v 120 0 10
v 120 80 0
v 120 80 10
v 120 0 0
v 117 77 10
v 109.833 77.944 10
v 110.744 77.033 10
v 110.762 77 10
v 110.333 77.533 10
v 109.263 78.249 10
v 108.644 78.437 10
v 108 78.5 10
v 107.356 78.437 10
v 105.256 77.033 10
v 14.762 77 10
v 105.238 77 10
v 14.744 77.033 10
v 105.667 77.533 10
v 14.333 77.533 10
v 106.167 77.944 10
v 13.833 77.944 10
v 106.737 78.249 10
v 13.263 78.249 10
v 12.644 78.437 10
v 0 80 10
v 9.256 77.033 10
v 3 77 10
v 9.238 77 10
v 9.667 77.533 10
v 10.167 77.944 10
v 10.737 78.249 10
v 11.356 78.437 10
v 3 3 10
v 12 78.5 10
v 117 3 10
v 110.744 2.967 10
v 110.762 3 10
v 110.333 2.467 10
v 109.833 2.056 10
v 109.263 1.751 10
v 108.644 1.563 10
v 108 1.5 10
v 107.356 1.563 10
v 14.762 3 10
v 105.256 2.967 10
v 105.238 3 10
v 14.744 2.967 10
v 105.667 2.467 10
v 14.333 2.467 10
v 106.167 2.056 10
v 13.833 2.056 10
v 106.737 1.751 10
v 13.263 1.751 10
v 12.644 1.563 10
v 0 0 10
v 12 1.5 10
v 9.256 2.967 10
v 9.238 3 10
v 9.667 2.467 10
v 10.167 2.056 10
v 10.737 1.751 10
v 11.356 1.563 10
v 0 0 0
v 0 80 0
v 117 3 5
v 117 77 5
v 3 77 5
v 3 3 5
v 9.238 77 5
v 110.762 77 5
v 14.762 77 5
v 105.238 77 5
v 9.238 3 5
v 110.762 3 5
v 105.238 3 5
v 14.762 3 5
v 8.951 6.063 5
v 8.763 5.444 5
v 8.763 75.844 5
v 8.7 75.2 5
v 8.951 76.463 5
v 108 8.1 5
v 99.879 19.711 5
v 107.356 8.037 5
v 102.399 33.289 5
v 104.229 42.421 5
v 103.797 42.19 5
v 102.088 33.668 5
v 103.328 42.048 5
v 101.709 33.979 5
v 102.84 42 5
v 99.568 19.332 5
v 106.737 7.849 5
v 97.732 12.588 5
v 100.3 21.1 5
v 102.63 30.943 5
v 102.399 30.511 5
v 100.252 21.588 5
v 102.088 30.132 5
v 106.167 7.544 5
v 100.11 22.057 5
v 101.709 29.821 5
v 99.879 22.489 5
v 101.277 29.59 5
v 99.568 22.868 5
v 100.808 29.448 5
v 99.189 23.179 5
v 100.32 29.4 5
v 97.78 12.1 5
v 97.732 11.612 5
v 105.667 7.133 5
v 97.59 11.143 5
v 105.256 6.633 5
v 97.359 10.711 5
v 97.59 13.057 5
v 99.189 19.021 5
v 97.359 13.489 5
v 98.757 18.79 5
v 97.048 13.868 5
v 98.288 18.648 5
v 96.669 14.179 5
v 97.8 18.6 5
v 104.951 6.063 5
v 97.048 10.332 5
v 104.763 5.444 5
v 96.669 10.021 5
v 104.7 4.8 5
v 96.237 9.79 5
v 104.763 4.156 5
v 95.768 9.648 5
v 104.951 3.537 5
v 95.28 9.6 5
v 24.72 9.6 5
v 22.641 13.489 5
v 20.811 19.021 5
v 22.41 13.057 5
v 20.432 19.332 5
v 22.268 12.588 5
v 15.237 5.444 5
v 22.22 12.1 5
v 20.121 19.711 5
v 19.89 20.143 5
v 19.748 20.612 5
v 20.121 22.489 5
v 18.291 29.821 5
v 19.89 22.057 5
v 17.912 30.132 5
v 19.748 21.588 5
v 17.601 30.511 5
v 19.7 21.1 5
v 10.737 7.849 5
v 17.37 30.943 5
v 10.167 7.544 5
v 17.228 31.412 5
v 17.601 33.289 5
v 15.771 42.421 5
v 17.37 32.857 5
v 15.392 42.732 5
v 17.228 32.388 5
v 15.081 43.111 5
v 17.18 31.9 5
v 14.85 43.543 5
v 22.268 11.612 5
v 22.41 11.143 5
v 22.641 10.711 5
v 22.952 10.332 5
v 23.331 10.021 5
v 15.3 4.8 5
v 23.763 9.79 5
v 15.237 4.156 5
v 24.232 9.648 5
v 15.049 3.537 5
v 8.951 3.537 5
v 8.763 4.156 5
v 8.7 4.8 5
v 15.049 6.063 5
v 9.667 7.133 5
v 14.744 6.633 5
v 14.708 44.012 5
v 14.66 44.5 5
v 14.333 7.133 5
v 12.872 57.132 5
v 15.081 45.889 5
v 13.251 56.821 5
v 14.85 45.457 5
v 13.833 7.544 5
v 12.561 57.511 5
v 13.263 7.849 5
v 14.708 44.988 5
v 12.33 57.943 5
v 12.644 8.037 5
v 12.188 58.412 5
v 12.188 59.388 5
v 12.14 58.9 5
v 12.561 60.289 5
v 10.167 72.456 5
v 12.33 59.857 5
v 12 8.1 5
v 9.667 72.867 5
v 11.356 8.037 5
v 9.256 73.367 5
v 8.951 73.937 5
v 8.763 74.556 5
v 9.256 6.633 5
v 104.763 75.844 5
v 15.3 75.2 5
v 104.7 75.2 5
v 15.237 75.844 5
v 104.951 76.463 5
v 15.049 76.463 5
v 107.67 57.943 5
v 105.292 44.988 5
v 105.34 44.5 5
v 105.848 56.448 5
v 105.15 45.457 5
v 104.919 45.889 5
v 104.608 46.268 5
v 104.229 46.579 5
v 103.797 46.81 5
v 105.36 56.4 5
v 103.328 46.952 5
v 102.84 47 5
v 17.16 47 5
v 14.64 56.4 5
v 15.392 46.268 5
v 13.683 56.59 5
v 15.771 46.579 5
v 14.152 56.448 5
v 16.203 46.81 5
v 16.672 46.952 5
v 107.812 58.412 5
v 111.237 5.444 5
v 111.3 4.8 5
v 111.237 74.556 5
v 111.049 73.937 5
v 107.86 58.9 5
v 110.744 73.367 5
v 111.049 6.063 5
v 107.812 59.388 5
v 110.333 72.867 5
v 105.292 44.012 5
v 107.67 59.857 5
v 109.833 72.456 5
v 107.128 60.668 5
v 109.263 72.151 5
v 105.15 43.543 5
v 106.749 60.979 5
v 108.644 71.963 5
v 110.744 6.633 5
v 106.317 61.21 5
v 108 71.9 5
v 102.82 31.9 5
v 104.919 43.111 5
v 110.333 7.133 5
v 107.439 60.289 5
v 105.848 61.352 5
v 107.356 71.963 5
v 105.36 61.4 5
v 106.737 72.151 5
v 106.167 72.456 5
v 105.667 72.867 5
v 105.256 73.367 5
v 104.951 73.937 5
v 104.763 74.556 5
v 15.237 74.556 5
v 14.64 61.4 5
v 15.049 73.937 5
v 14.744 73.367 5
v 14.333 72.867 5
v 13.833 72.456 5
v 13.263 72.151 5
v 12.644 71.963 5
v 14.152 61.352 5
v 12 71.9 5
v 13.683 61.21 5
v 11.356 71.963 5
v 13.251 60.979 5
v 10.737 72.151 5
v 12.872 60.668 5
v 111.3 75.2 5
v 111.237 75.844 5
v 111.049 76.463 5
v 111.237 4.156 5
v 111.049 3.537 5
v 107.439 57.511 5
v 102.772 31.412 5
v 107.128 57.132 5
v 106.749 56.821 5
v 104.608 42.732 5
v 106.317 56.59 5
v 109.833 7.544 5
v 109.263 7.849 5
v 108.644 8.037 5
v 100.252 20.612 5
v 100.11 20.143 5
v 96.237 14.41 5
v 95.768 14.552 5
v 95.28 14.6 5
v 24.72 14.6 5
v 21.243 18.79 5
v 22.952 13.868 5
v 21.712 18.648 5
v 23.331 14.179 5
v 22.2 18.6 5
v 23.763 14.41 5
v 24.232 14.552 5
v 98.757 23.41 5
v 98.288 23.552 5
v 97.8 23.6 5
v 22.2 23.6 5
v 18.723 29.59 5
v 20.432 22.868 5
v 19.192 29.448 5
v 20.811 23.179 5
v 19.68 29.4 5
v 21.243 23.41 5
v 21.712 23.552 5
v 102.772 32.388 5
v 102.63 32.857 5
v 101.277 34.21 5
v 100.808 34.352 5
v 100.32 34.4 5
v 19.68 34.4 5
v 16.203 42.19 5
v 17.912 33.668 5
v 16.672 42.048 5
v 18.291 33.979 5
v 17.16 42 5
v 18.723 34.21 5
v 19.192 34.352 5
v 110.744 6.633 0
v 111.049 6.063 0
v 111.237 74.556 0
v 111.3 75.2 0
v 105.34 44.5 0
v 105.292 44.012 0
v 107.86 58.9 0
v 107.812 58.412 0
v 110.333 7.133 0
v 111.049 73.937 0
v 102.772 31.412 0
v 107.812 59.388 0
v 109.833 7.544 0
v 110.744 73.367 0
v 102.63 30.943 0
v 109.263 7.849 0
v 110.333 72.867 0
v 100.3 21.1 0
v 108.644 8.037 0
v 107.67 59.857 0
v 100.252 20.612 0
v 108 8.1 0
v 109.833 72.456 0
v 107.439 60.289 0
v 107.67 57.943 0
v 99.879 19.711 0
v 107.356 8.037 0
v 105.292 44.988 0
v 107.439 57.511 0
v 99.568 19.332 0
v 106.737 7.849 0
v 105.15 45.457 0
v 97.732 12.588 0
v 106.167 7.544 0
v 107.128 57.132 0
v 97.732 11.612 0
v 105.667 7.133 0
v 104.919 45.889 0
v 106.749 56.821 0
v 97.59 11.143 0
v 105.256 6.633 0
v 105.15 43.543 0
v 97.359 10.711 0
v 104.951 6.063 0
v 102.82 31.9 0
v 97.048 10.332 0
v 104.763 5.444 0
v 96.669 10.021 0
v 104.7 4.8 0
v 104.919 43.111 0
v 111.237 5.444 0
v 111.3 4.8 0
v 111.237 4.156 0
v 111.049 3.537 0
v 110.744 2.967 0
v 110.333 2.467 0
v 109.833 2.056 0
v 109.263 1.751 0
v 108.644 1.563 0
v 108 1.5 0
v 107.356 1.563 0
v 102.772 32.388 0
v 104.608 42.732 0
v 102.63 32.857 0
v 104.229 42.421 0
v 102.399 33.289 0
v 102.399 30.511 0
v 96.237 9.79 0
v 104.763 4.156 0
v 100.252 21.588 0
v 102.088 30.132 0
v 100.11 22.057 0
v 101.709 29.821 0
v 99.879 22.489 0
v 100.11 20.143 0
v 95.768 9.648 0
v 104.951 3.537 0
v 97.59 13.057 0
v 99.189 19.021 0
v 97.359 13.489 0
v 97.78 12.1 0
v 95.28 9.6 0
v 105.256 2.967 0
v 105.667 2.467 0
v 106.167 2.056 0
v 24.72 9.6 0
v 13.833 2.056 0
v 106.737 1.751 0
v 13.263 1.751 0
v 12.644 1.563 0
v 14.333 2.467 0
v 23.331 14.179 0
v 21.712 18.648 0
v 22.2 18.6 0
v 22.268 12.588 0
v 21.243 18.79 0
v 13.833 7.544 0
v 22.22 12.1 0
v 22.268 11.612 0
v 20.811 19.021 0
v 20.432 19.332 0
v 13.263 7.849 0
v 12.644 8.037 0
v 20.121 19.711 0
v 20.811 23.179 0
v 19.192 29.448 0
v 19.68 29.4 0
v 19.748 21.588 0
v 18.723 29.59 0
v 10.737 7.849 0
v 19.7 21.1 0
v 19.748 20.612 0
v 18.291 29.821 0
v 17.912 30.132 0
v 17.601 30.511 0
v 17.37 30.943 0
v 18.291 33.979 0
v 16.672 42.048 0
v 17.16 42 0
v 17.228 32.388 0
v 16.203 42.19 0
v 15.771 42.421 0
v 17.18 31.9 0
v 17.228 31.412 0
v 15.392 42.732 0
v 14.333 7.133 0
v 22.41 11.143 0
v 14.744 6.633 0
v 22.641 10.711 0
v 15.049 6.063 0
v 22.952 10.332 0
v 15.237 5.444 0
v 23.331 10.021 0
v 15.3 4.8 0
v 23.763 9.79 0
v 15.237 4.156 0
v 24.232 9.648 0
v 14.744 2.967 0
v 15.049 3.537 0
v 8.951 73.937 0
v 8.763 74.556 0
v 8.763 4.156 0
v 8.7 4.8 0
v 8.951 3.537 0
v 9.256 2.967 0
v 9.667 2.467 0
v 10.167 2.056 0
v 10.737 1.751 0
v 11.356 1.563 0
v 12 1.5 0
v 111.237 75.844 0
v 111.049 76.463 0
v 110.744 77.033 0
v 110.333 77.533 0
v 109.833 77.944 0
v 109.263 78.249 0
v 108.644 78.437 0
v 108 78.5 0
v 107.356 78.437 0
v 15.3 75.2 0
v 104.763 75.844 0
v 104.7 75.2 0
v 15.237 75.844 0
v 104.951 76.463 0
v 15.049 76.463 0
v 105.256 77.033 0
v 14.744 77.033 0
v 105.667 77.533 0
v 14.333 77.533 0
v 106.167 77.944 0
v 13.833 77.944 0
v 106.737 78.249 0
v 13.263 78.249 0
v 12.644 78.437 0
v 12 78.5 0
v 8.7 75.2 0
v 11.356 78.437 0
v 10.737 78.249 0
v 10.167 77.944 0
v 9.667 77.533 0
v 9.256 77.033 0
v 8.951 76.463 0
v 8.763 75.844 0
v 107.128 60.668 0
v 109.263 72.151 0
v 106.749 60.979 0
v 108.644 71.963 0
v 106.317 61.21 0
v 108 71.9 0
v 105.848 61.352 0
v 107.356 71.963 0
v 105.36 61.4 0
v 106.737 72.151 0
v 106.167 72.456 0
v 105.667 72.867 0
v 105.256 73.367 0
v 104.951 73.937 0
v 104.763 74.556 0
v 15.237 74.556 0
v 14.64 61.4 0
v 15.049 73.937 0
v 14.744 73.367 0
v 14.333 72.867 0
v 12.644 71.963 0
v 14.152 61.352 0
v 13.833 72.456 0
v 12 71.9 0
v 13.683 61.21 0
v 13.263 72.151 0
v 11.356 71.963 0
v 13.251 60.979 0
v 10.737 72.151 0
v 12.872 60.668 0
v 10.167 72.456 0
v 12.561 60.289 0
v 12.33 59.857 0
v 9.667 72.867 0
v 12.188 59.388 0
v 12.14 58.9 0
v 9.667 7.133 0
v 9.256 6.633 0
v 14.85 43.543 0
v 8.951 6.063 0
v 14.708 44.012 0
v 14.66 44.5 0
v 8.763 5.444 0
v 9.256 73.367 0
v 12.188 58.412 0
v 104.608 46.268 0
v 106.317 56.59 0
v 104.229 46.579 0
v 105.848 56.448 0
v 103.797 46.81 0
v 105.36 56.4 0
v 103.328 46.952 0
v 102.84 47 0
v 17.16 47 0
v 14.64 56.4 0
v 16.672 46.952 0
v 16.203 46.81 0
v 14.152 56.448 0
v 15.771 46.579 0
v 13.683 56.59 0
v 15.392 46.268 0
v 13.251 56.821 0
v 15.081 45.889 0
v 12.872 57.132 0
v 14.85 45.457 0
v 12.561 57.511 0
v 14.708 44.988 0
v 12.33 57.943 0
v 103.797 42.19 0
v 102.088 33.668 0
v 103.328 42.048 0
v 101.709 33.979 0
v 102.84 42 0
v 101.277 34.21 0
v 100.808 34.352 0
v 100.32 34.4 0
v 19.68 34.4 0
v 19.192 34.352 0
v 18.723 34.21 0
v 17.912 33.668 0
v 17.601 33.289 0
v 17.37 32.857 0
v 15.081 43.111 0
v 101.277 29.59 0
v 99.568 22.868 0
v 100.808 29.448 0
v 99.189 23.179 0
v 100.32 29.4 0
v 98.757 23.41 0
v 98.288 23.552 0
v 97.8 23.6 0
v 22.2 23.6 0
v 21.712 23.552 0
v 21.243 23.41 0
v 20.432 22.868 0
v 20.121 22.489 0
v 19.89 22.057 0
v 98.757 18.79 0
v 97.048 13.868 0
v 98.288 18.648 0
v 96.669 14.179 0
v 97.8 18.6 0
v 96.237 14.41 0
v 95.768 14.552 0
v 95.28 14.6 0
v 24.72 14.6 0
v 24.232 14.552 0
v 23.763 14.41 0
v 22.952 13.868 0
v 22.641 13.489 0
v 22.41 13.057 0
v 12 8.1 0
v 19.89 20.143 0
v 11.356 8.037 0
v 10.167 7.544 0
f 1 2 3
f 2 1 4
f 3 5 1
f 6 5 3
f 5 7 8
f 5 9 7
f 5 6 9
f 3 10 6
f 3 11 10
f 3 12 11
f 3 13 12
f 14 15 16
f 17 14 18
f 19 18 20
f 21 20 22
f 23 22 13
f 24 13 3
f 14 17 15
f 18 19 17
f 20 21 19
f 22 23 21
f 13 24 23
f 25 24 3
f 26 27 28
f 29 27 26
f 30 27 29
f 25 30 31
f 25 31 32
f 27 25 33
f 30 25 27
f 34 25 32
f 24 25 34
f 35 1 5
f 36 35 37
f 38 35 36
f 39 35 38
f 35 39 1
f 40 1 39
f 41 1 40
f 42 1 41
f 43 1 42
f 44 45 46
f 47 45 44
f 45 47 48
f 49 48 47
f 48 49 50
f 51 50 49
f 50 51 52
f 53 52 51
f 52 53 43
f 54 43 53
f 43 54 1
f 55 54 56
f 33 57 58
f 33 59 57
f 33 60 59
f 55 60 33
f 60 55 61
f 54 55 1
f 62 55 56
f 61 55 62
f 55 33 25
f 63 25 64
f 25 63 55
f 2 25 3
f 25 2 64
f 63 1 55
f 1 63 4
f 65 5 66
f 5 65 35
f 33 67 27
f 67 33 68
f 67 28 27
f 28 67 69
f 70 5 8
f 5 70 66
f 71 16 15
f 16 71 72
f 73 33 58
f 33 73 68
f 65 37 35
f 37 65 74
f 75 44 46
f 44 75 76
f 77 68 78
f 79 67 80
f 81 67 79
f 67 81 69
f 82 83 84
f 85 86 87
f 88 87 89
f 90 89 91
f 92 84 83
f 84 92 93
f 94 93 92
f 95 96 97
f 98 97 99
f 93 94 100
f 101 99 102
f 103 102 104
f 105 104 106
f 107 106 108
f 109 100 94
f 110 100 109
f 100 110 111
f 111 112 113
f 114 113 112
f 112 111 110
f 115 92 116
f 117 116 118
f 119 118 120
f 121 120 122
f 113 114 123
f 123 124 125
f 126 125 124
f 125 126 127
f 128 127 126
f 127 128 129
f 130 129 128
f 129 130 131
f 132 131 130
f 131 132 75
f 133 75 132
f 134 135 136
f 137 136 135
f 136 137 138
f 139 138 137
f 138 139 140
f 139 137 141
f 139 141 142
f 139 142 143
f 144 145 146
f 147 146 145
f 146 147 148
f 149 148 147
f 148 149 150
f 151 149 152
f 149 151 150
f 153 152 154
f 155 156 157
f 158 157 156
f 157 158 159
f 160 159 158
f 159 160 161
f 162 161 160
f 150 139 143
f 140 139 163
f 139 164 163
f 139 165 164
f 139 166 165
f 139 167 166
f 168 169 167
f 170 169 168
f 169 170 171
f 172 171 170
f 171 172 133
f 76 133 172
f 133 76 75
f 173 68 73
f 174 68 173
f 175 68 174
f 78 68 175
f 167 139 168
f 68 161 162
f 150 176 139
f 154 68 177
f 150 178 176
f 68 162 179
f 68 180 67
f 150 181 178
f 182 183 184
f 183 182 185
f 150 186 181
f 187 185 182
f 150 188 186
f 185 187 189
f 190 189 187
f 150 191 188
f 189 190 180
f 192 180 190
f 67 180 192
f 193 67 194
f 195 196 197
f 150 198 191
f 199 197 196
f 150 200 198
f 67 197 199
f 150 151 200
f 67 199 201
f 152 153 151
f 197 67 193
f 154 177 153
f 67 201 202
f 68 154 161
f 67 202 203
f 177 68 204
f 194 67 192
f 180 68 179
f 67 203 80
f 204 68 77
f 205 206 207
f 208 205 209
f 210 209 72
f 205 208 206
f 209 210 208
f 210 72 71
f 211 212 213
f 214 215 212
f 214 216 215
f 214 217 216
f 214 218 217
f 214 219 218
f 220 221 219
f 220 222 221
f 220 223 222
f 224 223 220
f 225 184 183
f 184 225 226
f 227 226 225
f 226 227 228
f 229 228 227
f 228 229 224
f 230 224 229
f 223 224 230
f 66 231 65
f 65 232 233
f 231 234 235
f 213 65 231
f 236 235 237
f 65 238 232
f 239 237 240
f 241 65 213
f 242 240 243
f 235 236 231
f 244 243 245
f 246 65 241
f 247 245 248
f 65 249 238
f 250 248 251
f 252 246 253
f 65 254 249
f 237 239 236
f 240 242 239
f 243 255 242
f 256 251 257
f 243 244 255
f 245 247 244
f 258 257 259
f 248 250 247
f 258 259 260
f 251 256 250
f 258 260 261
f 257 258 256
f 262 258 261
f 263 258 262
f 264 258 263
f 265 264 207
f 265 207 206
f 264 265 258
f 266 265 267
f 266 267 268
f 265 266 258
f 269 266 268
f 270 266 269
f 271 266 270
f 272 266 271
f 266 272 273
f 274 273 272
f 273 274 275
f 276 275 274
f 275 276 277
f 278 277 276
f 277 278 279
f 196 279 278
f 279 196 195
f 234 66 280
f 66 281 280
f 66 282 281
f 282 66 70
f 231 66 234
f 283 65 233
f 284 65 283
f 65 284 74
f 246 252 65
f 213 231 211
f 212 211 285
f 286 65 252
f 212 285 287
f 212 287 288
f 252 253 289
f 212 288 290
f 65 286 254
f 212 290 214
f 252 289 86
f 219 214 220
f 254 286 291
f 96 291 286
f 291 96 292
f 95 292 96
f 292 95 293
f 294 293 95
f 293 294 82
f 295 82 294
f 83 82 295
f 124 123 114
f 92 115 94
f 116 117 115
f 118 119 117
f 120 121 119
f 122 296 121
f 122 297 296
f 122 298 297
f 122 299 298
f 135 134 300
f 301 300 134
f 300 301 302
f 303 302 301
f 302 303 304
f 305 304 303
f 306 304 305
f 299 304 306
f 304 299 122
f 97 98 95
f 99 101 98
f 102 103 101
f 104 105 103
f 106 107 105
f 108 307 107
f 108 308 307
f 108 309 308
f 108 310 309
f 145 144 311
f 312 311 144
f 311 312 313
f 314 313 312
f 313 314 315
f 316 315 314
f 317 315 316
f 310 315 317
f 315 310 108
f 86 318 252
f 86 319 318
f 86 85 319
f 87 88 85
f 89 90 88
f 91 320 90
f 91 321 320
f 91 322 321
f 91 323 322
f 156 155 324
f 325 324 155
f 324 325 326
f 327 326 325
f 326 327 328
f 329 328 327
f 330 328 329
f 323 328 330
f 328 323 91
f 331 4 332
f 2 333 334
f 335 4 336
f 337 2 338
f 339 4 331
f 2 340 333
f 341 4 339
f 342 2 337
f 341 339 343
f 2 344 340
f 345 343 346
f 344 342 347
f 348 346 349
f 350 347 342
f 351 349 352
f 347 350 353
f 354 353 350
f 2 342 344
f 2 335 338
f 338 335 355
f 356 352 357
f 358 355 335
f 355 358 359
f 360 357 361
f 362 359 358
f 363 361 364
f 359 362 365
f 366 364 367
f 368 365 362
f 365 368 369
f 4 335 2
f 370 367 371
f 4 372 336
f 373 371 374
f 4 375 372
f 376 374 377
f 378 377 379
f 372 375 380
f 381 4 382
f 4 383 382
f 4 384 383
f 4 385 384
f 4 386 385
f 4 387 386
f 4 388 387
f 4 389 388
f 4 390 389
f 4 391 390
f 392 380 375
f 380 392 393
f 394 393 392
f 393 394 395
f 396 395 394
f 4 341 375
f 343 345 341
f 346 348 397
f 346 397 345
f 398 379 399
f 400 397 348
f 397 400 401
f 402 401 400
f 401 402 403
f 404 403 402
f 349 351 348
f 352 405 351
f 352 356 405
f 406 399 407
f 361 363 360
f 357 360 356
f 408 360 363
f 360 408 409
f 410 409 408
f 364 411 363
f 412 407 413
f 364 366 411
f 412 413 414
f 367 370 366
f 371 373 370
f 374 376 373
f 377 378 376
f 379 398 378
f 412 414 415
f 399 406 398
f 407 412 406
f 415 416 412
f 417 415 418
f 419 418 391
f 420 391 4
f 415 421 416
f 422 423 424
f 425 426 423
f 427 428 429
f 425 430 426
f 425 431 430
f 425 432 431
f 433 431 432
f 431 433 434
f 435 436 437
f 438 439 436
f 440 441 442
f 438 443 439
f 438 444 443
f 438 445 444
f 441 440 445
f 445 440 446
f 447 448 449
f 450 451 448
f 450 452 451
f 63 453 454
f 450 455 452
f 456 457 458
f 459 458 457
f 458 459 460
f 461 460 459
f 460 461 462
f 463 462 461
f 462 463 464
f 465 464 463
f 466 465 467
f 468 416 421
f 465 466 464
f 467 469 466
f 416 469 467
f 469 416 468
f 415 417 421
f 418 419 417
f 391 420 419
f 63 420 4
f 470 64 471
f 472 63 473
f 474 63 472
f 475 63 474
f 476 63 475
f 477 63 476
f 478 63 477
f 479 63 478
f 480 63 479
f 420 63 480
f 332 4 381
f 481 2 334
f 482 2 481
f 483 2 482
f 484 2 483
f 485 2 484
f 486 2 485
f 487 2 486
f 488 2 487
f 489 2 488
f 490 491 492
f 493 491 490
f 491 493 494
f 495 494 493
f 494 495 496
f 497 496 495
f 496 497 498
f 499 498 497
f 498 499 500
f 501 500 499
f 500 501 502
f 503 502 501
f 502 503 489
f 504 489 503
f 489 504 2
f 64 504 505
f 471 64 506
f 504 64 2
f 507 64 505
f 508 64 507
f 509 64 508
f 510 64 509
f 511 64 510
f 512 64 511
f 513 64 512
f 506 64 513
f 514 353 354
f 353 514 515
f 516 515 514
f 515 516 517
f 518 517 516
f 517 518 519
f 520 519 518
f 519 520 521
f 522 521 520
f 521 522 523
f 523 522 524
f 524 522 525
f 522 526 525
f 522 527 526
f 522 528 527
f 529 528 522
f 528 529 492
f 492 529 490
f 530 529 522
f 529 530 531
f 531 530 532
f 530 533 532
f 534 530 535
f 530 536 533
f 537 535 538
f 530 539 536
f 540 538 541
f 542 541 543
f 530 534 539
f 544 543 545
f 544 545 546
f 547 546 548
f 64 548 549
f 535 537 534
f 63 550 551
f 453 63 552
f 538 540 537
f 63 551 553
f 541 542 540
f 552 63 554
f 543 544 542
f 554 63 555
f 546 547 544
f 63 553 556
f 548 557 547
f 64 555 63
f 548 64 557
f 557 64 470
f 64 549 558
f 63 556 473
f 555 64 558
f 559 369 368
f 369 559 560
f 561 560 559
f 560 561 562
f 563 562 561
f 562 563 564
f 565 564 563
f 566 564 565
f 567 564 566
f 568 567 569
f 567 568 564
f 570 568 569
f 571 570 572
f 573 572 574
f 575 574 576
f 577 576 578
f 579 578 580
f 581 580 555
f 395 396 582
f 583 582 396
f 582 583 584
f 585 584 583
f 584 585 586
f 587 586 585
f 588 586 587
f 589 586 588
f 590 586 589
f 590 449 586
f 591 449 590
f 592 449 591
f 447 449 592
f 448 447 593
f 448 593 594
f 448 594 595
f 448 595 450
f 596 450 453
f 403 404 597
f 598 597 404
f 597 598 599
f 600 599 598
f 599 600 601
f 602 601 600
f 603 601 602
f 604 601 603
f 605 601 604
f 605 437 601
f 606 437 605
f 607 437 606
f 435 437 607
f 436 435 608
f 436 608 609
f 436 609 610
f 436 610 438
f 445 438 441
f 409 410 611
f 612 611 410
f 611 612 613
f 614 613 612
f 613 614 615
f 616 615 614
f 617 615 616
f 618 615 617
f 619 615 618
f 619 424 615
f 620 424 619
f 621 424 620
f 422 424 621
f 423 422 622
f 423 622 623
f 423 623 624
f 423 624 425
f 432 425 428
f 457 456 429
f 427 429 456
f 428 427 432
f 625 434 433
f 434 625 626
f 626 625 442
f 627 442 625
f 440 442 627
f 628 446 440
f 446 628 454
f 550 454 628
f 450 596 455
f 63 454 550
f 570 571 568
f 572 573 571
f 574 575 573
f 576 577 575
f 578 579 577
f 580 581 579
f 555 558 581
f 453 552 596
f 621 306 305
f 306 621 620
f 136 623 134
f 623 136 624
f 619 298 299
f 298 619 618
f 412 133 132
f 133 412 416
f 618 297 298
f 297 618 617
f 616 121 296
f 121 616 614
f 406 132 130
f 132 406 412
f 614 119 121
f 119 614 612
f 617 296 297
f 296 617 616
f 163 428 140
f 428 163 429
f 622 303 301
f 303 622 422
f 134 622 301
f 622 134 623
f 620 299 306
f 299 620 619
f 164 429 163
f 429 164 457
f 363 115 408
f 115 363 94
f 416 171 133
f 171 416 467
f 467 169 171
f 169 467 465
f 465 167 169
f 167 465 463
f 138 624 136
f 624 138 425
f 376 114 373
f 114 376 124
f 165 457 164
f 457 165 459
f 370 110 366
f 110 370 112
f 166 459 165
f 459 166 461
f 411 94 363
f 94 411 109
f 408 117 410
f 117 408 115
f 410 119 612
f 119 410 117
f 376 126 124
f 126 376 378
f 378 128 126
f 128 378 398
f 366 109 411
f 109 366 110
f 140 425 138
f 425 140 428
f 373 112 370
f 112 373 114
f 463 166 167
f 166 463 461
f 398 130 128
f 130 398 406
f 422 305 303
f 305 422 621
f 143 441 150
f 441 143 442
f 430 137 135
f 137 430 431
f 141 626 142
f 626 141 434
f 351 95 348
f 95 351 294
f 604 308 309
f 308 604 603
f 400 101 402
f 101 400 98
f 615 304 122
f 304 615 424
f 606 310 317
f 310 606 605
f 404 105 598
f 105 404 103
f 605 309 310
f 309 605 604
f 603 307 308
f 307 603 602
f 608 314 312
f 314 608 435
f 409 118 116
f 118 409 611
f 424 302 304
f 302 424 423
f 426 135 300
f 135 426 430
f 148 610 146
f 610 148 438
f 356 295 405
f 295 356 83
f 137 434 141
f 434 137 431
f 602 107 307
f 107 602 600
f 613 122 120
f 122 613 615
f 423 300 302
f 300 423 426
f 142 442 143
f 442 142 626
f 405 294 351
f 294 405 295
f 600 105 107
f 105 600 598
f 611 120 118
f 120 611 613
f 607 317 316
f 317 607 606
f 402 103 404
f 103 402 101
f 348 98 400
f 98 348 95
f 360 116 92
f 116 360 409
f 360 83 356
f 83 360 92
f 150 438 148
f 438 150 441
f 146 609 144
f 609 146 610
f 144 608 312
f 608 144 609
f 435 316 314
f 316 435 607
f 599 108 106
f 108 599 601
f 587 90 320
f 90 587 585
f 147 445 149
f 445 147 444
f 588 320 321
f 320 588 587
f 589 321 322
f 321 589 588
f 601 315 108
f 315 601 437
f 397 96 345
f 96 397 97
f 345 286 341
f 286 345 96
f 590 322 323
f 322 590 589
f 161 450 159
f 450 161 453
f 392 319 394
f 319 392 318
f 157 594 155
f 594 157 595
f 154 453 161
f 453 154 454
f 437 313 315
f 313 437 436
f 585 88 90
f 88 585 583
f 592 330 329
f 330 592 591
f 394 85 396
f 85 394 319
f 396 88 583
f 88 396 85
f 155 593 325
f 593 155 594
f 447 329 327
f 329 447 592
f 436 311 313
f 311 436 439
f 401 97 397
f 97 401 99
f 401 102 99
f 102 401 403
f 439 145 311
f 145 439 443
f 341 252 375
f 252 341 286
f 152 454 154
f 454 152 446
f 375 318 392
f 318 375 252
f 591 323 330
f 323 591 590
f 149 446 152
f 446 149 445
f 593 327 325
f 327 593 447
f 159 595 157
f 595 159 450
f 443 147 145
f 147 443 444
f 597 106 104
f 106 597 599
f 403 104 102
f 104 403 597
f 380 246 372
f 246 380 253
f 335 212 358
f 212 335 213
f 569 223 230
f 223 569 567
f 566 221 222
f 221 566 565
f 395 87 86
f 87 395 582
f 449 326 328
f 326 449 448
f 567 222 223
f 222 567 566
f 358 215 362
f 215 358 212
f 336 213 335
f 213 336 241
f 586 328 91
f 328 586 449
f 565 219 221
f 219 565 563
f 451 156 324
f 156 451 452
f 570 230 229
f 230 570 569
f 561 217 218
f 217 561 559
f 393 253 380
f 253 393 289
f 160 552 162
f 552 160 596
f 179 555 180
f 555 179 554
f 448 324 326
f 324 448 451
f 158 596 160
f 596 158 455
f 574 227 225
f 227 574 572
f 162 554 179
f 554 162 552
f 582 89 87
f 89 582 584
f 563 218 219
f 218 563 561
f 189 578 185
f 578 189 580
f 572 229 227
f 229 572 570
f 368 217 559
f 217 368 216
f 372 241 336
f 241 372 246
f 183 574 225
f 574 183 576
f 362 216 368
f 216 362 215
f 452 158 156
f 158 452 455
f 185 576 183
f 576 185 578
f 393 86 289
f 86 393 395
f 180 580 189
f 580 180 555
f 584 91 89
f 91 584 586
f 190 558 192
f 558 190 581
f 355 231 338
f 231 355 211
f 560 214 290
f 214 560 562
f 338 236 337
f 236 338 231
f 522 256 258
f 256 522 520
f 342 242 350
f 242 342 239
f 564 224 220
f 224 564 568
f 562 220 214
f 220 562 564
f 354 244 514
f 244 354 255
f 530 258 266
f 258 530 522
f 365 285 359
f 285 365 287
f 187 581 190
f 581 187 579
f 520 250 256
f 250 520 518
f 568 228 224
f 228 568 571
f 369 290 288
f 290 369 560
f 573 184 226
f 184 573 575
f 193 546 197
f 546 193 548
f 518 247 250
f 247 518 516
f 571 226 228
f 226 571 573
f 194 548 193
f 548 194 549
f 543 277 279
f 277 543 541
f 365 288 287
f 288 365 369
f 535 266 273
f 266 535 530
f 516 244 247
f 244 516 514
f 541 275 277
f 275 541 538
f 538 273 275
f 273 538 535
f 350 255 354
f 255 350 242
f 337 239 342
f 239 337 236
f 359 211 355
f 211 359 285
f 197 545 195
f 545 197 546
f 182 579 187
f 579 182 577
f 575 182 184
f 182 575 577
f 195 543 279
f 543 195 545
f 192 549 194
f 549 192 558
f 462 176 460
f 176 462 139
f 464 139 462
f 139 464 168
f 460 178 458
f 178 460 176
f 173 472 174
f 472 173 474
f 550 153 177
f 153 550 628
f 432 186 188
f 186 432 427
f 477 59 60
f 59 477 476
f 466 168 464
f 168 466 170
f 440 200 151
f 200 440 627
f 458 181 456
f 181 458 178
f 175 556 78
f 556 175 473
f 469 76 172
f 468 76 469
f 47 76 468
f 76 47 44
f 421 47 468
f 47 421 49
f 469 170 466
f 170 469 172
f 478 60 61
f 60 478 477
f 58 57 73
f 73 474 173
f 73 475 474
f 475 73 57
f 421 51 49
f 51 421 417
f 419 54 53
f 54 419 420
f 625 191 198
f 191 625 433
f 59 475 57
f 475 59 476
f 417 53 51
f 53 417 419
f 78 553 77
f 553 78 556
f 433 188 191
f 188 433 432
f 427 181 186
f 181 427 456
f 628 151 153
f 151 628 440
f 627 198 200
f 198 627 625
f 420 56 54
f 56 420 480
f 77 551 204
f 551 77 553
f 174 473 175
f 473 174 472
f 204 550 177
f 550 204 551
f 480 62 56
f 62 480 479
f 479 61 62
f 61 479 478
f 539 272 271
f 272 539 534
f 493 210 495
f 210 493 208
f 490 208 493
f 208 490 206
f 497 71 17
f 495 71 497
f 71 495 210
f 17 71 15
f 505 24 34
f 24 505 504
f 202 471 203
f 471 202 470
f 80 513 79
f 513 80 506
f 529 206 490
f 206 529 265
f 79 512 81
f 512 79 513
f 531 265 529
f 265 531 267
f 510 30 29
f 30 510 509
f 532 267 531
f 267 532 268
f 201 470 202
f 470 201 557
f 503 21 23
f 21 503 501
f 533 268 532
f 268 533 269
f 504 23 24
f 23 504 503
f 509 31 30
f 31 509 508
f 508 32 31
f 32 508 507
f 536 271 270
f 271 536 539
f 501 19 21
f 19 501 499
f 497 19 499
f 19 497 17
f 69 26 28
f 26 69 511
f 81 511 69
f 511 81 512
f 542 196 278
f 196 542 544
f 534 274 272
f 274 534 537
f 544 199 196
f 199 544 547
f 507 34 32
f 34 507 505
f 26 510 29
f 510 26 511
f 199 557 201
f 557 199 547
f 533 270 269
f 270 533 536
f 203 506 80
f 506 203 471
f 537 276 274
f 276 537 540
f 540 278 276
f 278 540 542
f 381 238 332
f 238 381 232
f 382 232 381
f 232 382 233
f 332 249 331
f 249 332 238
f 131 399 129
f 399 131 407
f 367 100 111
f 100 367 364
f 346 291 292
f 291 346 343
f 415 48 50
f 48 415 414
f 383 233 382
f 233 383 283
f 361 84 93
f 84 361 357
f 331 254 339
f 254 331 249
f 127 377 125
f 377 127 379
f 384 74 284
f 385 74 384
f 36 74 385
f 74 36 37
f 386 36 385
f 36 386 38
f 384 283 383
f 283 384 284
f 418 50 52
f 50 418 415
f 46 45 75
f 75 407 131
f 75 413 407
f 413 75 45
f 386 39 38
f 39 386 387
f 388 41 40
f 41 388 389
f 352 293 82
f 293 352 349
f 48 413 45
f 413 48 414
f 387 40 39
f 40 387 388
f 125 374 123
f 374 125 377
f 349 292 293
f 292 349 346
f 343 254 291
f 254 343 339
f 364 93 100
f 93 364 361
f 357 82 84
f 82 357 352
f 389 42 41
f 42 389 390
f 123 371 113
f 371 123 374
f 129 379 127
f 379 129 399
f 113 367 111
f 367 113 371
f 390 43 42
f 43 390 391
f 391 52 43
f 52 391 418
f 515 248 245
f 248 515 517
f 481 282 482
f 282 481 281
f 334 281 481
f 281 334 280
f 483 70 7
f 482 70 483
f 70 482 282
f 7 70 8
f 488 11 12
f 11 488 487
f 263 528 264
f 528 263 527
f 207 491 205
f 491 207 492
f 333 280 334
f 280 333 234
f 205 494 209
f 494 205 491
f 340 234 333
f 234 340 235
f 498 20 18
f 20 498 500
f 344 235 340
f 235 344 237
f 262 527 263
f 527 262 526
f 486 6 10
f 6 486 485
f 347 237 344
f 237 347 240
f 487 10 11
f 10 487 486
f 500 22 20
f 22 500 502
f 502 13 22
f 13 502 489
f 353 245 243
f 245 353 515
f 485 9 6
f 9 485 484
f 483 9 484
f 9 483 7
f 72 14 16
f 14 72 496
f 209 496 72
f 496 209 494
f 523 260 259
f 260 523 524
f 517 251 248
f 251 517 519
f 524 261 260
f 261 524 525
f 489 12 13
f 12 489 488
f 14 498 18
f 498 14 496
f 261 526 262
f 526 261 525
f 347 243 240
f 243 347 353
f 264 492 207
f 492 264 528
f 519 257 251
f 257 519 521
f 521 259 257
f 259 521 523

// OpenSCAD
$fn = 32;

// ----------------------------------------------------------------------
// Slotted panel: 120 x 80 mm, 5 рядов of slots
// ----------------------------------------------------------------------

// --- parameters (mm) ---
panel_w = 120;            // panel width
panel_d = 80;             // panel depth
thick = 5;                // panel thickness
slot_w = 5;               // slot width
pitch0 = 9;               // first row pitch
pitch_step = 1.8;         // pitch increase per row
margin = 9.6;             // margin around the slot field
rows = 5;                 // number of slot rows
mount_d = 6.6;            // mounting holes
mount_x = 48;             // mounting hole offset
rim_h = 10;               // rim height
rim_t = 3;                // rim wall thickness

difference() {
  union() {
    cube([panel_w, panel_d, thick]);
    translate([0, 0, thick - 1]) difference() {
      cube([panel_w, panel_d, rim_h - thick + 1]);
      translate([rim_t, rim_t, -2.5]) cube([panel_w - 2 * rim_t, panel_d - 2 * rim_t, rim_h - thick + 6]);
    }
  }
  /* slot rows: stadium shaped cutters, 2.5 mm clear of both faces */
  /* row 0: pitch 9, length 70.56 */
  hull() {
    translate([24.72, 12.1, -2.5]) cylinder(h = thick + 5, d = slot_w);
    translate([95.28, 12.1, -2.5]) cylinder(h = thick + 5, d = slot_w);
  }
  /* row 1: pitch 10.8, length 75.6 */
  hull() {
    translate([22.2, 21.1, -2.5]) cylinder(h = thick + 5, d = slot_w);
    translate([97.8, 21.1, -2.5]) cylinder(h = thick + 5, d = slot_w);
  }
  /* row 2: pitch 12.6, length 80.64 */
  hull() {
    translate([19.68, 31.9, -2.5]) cylinder(h = thick + 5, d = slot_w);
    translate([100.32, 31.9, -2.5]) cylinder(h = thick + 5, d = slot_w);
  }
  /* row 3: pitch 14.4, length 85.68 */
  hull() {
    translate([17.16, 44.5, -2.5]) cylinder(h = thick + 5, d = slot_w);
    translate([102.84, 44.5, -2.5]) cylinder(h = thick + 5, d = slot_w);
  }
  /* row 4: pitch 16.2, length 90.72 */
  hull() {
    translate([14.64, 58.9, -2.5]) cylinder(h = thick + 5, d = slot_w);
    translate([105.36, 58.9, -2.5]) cylinder(h = thick + 5, d = slot_w);
  }
  translate([12, 4.8, -2.5]) cylinder(h = 15, d = mount_d);
  translate([12, 75.2, -2.5]) cylinder(h = 15, d = mount_d);
  translate([108, 4.8, -2.5]) cylinder(h = 15, d = mount_d);
  translate([108, 75.2, -2.5]) cylinder(h = 15, d = mount_d);
}
